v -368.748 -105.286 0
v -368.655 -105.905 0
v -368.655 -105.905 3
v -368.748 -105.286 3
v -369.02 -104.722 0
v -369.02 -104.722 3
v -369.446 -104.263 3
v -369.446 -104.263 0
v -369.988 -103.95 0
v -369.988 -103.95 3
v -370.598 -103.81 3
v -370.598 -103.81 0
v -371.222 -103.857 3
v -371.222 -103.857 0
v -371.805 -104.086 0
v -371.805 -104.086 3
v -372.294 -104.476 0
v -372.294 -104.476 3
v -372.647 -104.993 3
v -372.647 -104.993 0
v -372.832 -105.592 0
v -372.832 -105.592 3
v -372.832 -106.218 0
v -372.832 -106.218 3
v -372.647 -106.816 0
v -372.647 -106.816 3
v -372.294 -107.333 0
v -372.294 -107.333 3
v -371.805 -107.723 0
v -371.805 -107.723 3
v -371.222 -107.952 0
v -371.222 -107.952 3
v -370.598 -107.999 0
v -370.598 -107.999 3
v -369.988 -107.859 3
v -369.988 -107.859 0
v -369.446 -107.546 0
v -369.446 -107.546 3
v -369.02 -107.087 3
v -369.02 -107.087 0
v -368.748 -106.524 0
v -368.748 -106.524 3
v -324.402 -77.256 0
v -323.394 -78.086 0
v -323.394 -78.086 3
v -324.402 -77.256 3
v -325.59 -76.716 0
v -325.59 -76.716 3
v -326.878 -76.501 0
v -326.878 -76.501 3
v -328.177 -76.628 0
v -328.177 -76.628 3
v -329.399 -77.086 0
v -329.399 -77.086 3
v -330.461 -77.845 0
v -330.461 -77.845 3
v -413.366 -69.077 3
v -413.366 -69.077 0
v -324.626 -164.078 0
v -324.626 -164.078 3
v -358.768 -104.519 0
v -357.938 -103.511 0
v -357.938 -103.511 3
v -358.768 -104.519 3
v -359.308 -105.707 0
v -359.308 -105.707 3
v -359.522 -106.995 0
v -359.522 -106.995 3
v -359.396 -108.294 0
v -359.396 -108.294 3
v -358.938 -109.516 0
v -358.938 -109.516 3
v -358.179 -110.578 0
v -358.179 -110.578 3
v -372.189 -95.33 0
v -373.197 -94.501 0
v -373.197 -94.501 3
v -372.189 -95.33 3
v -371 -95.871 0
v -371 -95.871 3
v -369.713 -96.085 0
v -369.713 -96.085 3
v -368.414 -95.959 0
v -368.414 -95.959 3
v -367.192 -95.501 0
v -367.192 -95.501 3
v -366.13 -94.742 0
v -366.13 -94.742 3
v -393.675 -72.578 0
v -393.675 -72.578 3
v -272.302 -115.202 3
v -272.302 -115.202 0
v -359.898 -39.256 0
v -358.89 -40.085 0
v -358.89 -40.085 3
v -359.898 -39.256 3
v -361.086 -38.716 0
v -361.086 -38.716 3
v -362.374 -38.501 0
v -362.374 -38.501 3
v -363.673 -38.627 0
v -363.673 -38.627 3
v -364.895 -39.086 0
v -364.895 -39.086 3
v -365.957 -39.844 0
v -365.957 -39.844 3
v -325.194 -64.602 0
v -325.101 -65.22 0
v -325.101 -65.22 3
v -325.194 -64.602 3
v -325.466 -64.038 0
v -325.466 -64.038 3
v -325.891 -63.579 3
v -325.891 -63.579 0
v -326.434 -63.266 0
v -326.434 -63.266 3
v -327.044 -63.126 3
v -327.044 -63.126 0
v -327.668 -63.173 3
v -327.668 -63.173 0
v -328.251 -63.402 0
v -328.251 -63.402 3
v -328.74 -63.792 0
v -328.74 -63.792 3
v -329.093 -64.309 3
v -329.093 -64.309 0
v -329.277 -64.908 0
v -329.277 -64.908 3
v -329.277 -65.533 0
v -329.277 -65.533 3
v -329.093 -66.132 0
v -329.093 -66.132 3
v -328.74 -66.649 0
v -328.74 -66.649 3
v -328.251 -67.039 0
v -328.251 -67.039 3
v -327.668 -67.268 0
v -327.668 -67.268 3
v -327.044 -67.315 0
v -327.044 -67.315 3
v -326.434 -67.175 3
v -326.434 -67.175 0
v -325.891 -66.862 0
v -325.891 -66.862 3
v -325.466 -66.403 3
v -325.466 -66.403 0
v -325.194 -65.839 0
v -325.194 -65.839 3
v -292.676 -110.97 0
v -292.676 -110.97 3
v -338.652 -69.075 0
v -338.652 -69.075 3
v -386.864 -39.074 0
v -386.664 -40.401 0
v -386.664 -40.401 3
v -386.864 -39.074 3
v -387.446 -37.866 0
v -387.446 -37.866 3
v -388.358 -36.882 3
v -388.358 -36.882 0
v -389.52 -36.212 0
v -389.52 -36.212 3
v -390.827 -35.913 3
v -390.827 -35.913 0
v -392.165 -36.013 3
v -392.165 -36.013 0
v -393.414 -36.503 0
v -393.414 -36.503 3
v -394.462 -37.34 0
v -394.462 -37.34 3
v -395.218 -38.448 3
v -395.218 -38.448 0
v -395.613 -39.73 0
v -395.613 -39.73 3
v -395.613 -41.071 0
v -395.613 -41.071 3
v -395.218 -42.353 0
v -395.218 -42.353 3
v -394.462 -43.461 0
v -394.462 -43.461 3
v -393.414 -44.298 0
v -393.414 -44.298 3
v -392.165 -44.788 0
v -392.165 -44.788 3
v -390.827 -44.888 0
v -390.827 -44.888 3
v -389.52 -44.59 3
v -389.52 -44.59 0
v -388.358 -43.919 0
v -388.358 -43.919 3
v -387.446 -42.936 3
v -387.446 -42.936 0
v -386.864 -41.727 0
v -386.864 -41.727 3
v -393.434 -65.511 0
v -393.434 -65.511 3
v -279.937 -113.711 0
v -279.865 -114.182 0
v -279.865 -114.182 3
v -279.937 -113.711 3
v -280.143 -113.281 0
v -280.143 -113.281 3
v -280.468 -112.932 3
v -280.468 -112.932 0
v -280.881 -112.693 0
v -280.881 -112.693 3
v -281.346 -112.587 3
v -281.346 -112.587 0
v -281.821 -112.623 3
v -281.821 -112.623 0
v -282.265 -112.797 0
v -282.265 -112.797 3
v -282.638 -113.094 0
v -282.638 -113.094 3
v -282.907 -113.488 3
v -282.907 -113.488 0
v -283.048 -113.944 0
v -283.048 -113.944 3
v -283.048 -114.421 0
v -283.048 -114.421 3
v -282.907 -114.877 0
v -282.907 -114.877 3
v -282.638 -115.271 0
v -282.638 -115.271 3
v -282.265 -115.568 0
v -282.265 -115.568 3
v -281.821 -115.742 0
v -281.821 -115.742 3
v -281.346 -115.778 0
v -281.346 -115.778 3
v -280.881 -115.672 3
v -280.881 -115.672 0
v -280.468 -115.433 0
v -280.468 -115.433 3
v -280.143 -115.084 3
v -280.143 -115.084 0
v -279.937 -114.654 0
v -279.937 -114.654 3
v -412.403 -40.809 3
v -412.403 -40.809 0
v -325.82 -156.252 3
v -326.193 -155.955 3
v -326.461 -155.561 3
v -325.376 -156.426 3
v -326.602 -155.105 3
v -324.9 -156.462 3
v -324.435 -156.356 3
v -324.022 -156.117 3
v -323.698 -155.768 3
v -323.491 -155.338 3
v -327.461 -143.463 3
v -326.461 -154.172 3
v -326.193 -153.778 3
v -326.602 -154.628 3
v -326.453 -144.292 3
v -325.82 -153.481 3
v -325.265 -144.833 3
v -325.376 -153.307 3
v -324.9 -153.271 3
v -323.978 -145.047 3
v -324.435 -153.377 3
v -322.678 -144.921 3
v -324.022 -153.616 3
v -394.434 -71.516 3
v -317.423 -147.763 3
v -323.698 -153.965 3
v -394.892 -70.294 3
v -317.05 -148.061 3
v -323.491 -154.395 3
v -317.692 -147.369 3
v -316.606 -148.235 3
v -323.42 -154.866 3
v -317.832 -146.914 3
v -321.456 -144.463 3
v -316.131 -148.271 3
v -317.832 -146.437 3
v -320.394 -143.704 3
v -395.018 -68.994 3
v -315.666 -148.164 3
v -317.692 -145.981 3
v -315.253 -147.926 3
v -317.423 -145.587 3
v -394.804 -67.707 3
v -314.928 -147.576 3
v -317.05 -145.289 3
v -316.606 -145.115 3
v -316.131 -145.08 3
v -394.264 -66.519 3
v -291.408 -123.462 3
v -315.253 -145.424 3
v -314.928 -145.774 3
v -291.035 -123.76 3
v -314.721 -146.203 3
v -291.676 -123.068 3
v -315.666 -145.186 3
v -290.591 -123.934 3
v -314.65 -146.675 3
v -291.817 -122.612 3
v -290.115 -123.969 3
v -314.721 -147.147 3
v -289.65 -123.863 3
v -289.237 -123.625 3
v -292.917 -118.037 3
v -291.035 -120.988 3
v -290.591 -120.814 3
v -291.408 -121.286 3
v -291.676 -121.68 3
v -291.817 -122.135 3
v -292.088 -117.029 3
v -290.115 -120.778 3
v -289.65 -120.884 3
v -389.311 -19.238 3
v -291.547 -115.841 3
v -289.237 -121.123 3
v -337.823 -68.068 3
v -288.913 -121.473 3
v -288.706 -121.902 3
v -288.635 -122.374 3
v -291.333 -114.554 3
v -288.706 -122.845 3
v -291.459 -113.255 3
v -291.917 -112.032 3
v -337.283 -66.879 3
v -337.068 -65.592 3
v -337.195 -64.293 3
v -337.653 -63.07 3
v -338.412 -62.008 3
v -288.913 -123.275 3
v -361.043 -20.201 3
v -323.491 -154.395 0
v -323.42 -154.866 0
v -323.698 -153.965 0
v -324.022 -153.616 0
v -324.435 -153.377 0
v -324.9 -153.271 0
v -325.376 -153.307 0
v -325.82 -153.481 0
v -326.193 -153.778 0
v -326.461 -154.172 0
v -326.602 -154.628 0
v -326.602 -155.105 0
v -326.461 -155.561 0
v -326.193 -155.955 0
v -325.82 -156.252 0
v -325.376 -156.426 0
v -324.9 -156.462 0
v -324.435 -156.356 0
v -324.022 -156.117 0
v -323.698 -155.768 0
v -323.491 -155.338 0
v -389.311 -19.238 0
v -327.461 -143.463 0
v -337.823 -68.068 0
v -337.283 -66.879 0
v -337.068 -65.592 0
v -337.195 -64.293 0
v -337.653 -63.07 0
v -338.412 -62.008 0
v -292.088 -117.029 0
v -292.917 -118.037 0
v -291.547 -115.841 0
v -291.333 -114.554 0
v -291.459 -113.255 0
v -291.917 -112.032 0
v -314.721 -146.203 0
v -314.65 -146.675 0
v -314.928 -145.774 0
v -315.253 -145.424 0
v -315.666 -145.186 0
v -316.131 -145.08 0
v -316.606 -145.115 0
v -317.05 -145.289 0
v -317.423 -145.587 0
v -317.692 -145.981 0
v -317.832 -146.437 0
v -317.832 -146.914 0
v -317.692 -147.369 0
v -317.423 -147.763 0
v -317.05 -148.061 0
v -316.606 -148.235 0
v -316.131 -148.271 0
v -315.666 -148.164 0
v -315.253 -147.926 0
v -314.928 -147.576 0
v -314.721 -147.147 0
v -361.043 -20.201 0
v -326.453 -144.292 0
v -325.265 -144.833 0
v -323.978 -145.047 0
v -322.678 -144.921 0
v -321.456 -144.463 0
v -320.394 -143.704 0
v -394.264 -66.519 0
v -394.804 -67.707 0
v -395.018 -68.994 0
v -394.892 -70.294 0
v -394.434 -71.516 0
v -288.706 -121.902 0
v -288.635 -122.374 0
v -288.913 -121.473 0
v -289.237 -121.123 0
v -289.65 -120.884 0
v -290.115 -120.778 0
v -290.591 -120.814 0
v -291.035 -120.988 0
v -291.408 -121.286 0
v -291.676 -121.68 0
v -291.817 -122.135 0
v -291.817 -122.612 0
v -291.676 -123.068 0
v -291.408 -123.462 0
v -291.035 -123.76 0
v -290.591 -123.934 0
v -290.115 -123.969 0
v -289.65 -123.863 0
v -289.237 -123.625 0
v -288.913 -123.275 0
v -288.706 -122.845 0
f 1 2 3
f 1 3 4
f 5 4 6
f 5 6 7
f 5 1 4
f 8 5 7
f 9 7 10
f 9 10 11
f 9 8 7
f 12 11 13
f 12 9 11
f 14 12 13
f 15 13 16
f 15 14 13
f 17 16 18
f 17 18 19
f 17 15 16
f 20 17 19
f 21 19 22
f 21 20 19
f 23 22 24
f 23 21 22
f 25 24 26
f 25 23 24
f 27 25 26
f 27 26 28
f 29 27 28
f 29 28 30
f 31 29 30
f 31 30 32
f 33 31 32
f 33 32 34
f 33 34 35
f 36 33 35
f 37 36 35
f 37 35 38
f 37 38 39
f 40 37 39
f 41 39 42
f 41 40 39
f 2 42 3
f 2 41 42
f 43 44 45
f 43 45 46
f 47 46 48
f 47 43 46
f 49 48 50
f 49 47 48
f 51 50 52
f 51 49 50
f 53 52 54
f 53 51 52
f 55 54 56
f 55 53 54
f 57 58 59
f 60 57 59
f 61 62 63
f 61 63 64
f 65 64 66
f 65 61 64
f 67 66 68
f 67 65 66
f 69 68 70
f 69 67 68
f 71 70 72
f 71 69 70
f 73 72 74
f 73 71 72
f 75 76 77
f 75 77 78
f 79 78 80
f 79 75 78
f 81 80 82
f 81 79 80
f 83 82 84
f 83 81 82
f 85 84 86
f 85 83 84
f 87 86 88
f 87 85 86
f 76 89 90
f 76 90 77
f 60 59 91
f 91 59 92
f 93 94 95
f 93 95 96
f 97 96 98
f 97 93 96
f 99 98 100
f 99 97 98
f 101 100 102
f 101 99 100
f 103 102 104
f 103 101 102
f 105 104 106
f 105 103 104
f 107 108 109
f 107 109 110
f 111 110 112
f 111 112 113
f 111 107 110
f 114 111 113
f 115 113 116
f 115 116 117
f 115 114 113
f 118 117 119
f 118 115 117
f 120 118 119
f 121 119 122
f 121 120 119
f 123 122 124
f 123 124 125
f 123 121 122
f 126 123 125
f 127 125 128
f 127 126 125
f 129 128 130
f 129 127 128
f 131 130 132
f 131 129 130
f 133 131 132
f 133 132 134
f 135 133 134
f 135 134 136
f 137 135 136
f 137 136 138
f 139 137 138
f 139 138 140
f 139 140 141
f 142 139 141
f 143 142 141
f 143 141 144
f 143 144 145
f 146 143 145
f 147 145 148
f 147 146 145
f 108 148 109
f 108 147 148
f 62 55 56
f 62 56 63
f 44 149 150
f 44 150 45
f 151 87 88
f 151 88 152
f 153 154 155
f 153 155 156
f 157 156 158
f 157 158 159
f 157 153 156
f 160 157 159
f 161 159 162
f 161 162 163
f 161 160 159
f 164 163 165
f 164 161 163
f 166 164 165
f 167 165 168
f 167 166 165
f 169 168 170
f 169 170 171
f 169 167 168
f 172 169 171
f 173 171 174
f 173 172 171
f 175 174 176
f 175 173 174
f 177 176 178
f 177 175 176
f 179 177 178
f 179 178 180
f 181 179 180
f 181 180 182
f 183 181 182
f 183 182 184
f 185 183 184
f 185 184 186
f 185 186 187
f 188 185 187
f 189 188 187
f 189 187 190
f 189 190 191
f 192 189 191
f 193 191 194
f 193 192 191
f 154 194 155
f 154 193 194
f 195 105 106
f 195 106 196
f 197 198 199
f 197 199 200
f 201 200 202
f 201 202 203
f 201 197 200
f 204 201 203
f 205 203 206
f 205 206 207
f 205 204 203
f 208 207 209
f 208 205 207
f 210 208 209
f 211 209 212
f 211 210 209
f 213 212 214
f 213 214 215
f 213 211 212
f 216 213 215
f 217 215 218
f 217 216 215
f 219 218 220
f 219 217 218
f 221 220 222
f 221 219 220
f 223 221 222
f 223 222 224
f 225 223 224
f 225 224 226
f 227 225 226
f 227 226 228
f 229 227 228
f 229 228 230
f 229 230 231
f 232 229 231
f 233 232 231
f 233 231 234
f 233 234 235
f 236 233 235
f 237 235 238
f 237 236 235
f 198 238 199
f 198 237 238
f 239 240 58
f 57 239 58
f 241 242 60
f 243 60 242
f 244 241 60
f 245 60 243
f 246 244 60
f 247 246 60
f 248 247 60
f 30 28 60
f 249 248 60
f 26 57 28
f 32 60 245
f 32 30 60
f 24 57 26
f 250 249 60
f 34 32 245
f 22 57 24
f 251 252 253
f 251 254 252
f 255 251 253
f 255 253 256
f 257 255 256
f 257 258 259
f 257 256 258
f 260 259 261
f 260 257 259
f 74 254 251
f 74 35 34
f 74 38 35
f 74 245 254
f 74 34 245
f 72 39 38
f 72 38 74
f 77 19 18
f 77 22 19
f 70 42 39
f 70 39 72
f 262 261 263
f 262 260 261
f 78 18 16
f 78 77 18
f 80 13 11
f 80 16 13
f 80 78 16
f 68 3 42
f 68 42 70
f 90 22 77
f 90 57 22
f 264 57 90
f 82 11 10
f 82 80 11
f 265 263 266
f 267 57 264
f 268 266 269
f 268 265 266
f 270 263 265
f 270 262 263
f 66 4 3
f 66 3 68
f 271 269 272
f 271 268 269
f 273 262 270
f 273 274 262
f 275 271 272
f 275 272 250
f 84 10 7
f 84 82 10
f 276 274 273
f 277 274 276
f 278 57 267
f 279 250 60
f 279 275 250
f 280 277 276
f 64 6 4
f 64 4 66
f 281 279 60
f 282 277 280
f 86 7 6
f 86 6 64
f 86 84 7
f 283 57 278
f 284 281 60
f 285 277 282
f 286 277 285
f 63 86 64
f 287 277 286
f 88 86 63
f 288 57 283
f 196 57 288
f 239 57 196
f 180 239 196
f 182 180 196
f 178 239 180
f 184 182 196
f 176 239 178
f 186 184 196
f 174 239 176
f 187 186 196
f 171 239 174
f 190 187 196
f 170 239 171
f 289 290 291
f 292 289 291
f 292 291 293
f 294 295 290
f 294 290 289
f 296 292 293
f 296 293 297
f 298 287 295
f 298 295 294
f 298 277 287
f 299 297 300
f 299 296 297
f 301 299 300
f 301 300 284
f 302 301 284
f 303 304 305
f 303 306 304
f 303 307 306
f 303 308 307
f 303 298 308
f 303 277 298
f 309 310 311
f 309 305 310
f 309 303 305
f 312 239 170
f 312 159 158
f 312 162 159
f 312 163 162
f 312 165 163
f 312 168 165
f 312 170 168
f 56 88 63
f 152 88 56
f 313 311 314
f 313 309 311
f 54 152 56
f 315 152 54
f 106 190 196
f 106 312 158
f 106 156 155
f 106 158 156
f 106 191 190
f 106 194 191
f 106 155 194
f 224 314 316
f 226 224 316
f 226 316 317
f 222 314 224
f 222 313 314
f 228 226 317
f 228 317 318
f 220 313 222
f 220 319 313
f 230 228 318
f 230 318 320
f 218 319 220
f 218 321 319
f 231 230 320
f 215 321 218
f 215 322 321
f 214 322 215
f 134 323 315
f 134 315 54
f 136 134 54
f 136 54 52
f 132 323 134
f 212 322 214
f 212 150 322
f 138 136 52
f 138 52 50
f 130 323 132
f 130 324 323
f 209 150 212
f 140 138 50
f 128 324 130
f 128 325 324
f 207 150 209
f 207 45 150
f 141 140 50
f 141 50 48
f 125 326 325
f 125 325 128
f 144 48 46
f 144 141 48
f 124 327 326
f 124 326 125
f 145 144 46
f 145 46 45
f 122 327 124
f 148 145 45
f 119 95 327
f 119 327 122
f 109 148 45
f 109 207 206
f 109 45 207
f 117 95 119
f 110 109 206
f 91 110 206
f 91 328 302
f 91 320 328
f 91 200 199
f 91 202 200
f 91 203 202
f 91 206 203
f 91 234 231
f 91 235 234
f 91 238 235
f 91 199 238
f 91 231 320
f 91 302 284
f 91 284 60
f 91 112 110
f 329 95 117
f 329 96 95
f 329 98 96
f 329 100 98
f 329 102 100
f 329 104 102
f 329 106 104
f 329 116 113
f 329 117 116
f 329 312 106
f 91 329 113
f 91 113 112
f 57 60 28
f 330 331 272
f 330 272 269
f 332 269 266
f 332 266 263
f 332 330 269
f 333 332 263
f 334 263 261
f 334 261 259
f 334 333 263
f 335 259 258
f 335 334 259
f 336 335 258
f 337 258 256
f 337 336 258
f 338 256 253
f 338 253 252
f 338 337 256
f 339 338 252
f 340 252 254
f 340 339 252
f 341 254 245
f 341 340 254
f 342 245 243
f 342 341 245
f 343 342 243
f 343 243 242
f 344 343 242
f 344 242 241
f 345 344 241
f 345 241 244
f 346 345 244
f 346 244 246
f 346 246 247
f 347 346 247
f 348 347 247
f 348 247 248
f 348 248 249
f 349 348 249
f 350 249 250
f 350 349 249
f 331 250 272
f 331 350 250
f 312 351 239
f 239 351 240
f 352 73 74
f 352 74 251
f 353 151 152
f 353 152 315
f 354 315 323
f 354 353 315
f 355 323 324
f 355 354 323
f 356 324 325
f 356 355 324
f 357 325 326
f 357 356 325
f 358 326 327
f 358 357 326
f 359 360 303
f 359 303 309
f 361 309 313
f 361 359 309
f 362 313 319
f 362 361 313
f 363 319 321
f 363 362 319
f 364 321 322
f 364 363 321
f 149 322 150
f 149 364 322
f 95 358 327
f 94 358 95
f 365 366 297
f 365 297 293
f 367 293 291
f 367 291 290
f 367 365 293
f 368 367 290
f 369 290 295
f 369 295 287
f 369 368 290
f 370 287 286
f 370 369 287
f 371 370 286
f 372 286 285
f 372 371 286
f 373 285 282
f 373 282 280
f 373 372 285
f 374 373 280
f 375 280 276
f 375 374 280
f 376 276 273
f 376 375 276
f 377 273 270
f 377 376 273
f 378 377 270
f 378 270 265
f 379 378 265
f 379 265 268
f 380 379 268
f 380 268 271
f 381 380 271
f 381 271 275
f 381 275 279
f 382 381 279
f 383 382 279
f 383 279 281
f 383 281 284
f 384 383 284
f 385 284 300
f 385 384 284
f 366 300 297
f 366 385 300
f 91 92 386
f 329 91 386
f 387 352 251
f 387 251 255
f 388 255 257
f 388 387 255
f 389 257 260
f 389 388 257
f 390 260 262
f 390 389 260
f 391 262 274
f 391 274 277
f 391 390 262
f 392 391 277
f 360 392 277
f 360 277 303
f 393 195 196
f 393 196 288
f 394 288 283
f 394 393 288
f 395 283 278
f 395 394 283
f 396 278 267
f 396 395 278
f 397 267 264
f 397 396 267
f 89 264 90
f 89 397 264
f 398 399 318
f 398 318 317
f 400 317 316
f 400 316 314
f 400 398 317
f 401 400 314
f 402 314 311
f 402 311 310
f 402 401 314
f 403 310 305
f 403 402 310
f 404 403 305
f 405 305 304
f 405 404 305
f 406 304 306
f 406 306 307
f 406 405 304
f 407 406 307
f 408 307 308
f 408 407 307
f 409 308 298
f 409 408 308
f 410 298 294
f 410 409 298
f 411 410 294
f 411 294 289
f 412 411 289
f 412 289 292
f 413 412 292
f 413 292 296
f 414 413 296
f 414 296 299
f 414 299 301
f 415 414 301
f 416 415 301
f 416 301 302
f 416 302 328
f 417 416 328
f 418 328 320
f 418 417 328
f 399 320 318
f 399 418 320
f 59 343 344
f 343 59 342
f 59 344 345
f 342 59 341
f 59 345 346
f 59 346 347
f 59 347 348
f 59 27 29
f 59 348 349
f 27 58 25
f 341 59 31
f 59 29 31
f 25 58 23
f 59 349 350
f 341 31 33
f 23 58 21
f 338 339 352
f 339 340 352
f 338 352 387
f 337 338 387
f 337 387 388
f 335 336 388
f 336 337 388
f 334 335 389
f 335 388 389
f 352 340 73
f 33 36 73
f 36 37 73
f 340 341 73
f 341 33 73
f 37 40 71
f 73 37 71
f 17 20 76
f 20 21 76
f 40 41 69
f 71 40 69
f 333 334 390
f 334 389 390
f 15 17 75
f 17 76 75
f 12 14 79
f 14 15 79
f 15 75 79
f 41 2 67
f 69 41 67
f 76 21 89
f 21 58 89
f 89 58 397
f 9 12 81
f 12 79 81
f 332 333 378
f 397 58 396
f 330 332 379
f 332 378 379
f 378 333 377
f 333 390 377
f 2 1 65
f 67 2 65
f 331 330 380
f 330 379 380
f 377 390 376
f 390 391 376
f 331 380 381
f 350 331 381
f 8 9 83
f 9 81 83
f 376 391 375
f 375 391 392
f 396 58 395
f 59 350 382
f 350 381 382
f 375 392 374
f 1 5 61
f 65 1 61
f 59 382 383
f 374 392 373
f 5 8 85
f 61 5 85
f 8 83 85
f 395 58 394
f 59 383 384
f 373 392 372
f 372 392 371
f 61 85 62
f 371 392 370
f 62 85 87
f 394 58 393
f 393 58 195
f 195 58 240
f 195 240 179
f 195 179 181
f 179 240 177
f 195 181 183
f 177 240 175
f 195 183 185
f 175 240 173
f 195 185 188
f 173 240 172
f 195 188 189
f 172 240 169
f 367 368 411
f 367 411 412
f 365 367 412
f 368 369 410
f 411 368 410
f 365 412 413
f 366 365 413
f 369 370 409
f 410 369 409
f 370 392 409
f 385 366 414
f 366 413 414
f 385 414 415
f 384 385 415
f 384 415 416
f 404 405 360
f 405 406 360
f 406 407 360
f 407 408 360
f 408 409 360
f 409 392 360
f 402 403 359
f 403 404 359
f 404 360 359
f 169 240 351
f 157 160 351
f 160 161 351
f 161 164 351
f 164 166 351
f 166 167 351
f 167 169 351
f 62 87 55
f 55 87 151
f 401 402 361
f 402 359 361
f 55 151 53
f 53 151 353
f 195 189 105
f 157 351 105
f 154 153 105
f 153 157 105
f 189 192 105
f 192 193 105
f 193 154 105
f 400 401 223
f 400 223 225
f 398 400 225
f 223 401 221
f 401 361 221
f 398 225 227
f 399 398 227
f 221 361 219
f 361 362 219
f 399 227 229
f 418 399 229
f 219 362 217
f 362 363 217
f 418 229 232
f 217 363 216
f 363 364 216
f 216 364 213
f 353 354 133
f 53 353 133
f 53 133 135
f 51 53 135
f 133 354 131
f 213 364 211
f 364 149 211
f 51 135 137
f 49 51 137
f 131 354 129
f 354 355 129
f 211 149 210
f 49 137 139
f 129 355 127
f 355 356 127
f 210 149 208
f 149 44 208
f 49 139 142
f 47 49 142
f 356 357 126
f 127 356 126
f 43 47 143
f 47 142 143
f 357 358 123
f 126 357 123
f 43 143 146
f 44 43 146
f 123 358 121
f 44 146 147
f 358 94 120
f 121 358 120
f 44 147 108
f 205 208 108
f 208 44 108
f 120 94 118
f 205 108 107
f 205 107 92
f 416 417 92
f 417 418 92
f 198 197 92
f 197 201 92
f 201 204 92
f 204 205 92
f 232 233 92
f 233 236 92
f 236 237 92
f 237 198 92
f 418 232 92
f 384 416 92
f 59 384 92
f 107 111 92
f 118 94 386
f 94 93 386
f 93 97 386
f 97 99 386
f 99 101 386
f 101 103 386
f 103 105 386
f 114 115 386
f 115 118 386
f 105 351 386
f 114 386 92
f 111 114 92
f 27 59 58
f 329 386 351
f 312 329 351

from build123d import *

# Parameters (mm, degrees)
SKETCH_1_R      = 2.1
SKETCH_1_R_2    = 4.5
SKETCH_1_R_3    = 1.6
EXTRUDE_1_DEPTH = 3


with BuildPart() as part:
    # 草图1 → 凸台-拉伸1 (new body)
    with BuildSketch(Plane.XY):
        Polygon((-324.62596071, -164.077614251), (-272.3024403, -115.202168351), (-361.042775034, -20.201363137), (-389.310642718, -19.238213832), (-412.403146139, -40.808941352), (-413.366295444, -69.076809037), align=None)
        with Locations((-327.200821851, -65.220494679)):
            Circle(SKETCH_1_R, mode=Mode.SUBTRACT)
        with Locations((-370.755037164, -105.904525064)):
            Circle(SKETCH_1_R, mode=Mode.SUBTRACT)
        with Locations((-391.163719404, -40.400588623)):
            Circle(SKETCH_1_R_2, mode=Mode.SUBTRACT)
        with Locations((-325.019633878, -154.866478521)):
            Circle(SKETCH_1_R_3, mode=Mode.SUBTRACT)
        with Locations((-316.250328782, -146.675063007)):
            Circle(SKETCH_1_R_3, mode=Mode.SUBTRACT)
        with Locations((-290.234723661, -122.373863649)):
            Circle(SKETCH_1_R_3, mode=Mode.SUBTRACT)
        with Locations((-281.465418565, -114.182448135)):
            Circle(SKETCH_1_R_3, mode=Mode.SUBTRACT)
        with BuildLine():
            Line((-320.394194004, -143.703803843), (-292.917038034, -118.037368566))
            ThreePointArc((-292.917038034, -118.037368566), (-291.333027599, -114.553753794), (-292.676250708, -110.970401645))
            Line((-292.676250708, -110.970401645), (-323.394058885, -78.085507532))
            ThreePointArc((-323.394058885, -78.085507532), (-326.877673657, -76.501497097), (-330.461025806, -77.844720206))
            Line((-330.461025806, -77.844720206), (-357.938181776, -103.511155483))
            ThreePointArc((-357.938181776, -103.511155483), (-359.522192211, -106.994770255), (-358.178969102, -110.578122404))
            Line((-358.178969102, -110.578122404), (-327.461160925, -143.463016517))
            ThreePointArc((-327.461160925, -143.463016517), (-323.977546152, -145.047026952), (-320.394194004, -143.703803843))
        make_face(mode=Mode.SUBTRACT)
        with BuildLine():
            Line((-366.12959729, -94.741850386), (-338.65244132, -69.075415109))
            ThreePointArc((-338.65244132, -69.075415109), (-337.068430885, -65.591800337), (-338.411653994, -62.008448188))
            Line((-338.411653994, -62.008448188), (-358.890192778, -40.085185447))
            ThreePointArc((-358.890192778, -40.085185447), (-362.373807551, -38.501175012), (-365.957159699, -39.84439812))
            Line((-365.957159699, -39.84439812), (-393.434315669, -65.510833397))
            ThreePointArc((-393.434315669, -65.510833397), (-395.018326104, -68.99444817), (-393.675102995, -72.577800318))
            Line((-393.675102995, -72.577800318), (-373.196564211, -94.50106306))
            ThreePointArc((-373.196564211, -94.50106306), (-369.712949438, -96.085073495), (-366.12959729, -94.741850386))
        make_face(mode=Mode.SUBTRACT)
    extrude(amount=EXTRUDE_1_DEPTH)


solid = part.part
